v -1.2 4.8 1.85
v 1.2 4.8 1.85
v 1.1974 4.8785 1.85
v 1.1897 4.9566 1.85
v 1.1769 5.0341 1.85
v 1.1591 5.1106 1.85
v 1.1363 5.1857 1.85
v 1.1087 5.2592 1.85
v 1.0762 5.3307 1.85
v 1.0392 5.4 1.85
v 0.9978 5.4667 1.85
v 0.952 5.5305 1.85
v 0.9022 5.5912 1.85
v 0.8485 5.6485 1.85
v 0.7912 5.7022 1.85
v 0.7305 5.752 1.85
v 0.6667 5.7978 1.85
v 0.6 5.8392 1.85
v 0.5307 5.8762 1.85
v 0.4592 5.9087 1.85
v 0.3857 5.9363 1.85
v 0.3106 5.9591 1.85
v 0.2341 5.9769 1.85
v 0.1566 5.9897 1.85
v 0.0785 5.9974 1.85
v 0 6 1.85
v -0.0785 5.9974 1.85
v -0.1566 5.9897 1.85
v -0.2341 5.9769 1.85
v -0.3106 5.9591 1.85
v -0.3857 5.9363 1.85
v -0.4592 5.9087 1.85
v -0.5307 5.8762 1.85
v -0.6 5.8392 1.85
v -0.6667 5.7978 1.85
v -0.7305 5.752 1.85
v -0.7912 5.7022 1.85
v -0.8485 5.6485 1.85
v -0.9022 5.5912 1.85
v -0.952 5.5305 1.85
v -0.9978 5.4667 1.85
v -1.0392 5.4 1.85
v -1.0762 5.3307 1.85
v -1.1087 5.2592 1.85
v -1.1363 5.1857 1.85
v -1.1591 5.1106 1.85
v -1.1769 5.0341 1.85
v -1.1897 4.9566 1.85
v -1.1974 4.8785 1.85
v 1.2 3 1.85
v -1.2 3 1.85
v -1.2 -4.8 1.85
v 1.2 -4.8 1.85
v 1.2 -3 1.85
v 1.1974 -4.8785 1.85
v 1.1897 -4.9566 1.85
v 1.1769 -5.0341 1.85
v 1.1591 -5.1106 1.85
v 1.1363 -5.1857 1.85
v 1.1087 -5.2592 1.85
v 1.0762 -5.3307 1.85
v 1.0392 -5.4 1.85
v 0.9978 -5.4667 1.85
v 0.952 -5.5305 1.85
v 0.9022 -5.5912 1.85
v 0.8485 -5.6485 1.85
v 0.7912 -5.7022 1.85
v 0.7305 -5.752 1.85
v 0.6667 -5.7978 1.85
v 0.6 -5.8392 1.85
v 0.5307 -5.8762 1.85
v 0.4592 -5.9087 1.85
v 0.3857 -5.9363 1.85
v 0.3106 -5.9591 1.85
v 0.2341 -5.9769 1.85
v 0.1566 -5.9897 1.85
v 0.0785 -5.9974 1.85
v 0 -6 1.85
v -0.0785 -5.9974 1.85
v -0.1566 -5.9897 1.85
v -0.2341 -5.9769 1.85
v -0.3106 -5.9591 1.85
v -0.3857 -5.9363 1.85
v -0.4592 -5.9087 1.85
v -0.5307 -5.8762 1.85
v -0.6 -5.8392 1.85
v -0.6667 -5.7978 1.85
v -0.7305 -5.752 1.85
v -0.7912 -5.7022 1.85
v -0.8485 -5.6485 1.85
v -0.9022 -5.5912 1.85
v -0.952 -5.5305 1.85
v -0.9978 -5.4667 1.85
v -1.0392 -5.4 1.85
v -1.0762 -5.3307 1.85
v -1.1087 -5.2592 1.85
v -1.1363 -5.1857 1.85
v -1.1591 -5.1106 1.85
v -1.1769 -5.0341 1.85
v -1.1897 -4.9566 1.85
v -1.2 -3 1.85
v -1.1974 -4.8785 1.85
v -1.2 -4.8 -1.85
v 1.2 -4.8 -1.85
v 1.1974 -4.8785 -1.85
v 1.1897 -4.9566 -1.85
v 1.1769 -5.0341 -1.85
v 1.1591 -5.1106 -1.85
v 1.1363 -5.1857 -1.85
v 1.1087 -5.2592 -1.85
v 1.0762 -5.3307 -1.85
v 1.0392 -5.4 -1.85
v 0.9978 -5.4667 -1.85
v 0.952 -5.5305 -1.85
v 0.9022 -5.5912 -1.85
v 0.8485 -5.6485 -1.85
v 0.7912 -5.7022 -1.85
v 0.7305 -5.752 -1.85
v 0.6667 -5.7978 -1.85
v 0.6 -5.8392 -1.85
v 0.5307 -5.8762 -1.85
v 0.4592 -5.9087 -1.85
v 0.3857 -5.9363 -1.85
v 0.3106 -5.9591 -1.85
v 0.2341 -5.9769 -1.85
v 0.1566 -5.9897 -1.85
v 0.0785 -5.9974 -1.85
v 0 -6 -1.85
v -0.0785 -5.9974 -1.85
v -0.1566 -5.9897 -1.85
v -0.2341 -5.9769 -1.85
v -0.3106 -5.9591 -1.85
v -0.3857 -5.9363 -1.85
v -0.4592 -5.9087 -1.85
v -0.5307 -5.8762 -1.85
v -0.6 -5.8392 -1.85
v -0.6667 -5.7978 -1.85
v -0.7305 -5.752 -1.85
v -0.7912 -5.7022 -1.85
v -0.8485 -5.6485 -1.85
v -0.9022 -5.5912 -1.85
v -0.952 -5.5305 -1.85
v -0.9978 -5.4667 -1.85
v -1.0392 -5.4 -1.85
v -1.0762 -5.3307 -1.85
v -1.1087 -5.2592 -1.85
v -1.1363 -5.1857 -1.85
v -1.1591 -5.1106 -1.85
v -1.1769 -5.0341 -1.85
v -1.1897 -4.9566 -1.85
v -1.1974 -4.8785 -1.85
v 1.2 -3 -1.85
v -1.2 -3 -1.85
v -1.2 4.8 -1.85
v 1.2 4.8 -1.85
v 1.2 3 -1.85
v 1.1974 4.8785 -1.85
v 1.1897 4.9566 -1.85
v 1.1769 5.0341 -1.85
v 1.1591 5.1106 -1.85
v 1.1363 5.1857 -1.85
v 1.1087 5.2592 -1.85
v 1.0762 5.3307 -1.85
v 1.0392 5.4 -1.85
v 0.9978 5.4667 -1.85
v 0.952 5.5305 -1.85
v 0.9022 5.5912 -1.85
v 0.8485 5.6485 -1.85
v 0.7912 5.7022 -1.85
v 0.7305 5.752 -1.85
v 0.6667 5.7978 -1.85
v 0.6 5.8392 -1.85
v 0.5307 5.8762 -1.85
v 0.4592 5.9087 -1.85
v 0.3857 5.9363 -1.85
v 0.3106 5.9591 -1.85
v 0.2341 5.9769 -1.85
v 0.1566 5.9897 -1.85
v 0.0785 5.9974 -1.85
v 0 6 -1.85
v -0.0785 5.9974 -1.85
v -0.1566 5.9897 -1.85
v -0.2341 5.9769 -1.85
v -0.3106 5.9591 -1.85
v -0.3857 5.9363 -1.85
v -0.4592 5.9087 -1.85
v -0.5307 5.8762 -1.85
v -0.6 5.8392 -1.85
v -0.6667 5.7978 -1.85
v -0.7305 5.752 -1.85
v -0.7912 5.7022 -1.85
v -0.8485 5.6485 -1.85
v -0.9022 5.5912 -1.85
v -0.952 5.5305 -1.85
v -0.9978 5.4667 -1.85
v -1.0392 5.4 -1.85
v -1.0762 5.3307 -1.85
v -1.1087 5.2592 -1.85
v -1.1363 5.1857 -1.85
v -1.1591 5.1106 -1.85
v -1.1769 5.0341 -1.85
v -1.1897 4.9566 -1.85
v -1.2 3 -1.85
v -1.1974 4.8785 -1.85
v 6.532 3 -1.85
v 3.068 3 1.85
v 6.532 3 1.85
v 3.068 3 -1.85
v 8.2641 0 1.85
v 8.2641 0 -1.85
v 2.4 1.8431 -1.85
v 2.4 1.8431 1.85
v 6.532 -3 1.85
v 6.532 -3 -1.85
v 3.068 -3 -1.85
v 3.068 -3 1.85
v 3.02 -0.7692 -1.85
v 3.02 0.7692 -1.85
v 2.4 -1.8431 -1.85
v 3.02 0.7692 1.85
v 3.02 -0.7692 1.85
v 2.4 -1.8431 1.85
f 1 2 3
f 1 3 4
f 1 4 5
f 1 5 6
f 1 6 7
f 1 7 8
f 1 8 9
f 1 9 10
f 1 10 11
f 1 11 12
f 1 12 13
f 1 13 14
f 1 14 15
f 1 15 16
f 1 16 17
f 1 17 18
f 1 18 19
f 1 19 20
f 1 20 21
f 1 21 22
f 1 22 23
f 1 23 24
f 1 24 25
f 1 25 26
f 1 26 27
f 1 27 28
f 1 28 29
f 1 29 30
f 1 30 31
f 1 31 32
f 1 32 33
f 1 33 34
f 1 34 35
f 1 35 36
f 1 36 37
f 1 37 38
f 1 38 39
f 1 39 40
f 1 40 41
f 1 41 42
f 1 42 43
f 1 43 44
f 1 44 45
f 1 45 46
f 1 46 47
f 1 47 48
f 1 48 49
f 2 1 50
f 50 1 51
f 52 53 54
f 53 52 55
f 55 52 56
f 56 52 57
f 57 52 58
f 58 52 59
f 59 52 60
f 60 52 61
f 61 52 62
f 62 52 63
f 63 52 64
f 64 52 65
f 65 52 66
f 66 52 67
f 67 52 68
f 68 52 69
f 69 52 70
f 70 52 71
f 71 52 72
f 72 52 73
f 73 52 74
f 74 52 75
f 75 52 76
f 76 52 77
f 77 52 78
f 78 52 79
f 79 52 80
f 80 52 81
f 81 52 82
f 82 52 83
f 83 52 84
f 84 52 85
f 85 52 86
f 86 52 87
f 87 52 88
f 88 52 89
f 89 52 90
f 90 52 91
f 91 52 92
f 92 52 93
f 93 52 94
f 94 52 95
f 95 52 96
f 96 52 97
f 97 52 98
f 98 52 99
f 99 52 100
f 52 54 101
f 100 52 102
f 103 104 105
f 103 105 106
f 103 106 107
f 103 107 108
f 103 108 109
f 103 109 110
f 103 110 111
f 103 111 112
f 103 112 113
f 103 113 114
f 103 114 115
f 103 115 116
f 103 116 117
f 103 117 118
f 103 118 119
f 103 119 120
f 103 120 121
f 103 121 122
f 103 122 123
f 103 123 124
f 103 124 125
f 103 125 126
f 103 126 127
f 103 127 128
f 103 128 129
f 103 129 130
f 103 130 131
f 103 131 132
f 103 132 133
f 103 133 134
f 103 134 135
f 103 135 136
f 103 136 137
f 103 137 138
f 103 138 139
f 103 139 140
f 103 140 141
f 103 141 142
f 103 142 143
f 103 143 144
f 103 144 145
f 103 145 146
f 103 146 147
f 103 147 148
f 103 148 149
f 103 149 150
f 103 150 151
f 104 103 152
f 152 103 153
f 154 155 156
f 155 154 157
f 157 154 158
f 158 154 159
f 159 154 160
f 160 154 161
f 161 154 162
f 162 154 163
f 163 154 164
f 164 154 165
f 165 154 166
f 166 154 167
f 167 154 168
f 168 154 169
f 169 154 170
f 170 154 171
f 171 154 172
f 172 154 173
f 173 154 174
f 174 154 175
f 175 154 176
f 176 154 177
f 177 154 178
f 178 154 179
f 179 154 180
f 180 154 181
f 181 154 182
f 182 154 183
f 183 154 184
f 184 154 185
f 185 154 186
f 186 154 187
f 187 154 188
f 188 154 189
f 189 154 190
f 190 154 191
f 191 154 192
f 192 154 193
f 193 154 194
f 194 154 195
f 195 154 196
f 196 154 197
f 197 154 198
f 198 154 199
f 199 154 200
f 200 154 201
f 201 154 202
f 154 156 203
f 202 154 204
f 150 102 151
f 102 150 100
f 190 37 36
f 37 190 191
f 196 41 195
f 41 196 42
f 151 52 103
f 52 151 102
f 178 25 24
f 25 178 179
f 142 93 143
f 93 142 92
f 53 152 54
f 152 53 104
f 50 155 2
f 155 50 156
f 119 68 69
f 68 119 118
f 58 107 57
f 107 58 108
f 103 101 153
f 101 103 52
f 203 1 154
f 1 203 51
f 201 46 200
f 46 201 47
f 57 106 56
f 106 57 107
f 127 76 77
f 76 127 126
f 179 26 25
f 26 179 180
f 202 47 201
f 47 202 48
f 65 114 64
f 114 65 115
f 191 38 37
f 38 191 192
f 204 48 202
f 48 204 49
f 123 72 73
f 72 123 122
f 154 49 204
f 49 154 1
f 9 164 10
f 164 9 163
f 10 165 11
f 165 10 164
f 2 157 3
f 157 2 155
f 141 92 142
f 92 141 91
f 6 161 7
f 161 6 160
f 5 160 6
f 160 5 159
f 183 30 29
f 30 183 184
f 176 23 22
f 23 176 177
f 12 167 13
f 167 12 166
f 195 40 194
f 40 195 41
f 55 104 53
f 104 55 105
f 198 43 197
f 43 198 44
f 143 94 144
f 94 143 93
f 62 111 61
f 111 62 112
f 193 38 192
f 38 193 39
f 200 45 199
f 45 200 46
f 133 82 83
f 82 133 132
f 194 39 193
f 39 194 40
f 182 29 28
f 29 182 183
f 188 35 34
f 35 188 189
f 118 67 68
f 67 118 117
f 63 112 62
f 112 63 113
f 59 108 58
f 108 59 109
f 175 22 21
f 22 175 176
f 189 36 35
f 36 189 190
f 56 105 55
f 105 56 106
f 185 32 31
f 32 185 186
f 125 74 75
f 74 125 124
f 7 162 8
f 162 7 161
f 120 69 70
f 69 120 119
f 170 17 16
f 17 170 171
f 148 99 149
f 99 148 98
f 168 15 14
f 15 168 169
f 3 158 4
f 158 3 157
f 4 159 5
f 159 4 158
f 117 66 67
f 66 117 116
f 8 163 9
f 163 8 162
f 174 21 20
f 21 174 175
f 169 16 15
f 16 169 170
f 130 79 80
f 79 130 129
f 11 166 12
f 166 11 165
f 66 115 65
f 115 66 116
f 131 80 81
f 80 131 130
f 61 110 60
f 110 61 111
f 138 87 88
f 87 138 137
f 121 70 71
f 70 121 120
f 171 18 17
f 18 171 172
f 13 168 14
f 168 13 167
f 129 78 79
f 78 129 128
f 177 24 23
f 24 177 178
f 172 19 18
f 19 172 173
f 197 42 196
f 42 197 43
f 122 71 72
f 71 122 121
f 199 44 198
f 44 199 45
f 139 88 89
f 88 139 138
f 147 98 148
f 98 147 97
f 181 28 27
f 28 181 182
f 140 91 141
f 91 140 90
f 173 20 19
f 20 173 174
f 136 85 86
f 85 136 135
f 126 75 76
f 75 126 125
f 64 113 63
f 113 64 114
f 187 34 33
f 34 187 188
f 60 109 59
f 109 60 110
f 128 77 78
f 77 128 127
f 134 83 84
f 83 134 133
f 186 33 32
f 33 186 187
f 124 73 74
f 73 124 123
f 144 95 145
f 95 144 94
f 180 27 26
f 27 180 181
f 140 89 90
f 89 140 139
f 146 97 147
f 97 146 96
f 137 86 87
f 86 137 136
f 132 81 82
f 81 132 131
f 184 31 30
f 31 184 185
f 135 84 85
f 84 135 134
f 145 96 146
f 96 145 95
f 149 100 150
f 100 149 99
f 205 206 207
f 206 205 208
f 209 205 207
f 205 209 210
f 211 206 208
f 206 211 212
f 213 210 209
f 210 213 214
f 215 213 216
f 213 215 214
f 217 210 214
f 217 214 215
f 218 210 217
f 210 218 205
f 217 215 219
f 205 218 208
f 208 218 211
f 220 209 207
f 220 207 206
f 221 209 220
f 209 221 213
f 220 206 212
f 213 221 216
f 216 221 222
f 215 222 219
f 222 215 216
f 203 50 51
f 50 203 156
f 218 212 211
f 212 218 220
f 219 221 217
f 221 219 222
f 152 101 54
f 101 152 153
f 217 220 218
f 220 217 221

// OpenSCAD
$fn = 96;

// Target constraints
nut_thickness  = 3.7;   // Z thickness
nut_width_af   = 6.0;   // across flats (hex)
screw_diameter = 4.0;   // M4 clearance/through

// T-slot nut body sizing (typical)
body_len   = 12.0;      // length along slot (Y)
corner_r   = 1.2;       // end rounding for obround (<= min(body_len/2, body_w/2))

// Anti-rotation nibs (small bumps on the long sides)
nib_w = 1.0;            // nib width in X
nib_h = 0.6;            // nib protrusion in Y

// Robust overlap to guarantee connectivity (1–2mm as required)
overlap = 1.2;
eps     = 0.02;

// 2D obround (capsule) profile: length along Y, width along X
module obround2d(len_y, wid_x, r) {
    r2 = min(r, wid_x/2, len_y/2);
    hull() {
        translate([0,  len_y/2 - r2]) circle(r=r2);
        translate([0, -len_y/2 + r2]) circle(r=r2);
    }
}

// 2D regular hex with across-flats = af
module hex2d_af(af) {
    // For a regular hex, circumradius R = af / sqrt(3)
    R = af / sqrt(3);
    polygon(points=[for (i=[0:5]) [R*cos(60*i), R*sin(60*i)]]);
}

// Nut (hex prism) that is physically attached to the T-slot body
module attached_hex_nut() {
    // Hex nut thickness: keep same as body to match original intent (3.7mm)
    nut_h = nut_thickness;

    // Place nut on +X side and overlap into body by 'overlap'
    // Body half-width in X is nut_width_af/2 (since body width uses nut_width_af)
    // Nut half-width across flats is nut_width_af/2 as well.
    // Center-to-center offset for overlap:
    // (body_half + nut_half - overlap)
    x_off = (nut_width_af/2) + (nut_width_af/2) - overlap;

    translate([x_off, 0, 0])
        linear_extrude(height=nut_h, center=true)
            hex2d_af(nut_width_af);
}

module t_slot_nut() {
    difference() {
        // ONE connected solid: main body + nibs + attached nut (with guaranteed overlap)
        union() {
            // Main body: obround block (X=nut_width_af, Y=body_len, Z=nut_thickness)
            linear_extrude(height=nut_thickness, center=true)
                obround2d(body_len, nut_width_af, corner_r);

            // Anti-rotation nibs on ±Y (intersect main body by 'overlap')
            for (sy = [-1, 1]) {
                translate([0,
                           sy * (body_len/2 + nib_h/2 - overlap),
                           0])
                    cube([nib_w, nib_h, nut_thickness], center=true);
            }

            // Missing part: nut (hex body) — attached with 1–2mm overlap
            attached_hex_nut();
        }

        // Central through-hole for M4 (through everything)
        cylinder(d=screw_diameter, h=nut_thickness + 4, center=true);

        // Hex pocket/profile (across flats = 6.0mm) in the MAIN BODY ONLY.
        // Limit the pocket to the body region so the added nut remains a solid "nut" part.
        // Body spans X in [-nut_width_af/2, +nut_width_af/2].
        // Clip the pocket to that range (with a tiny margin).
        intersection() {
            linear_extrude(height=nut_thickness + 4, center=true)
                hex2d_af(nut_width_af);

            translate([-nut_width_af/2 - eps, -body_len/2 - eps, -(nut_thickness/2 + 2)])
                cube([nut_width_af + 2*eps, body_len + 2*eps, nut_thickness + 4], center=false);
        }
    }
}

t_slot_nut();
